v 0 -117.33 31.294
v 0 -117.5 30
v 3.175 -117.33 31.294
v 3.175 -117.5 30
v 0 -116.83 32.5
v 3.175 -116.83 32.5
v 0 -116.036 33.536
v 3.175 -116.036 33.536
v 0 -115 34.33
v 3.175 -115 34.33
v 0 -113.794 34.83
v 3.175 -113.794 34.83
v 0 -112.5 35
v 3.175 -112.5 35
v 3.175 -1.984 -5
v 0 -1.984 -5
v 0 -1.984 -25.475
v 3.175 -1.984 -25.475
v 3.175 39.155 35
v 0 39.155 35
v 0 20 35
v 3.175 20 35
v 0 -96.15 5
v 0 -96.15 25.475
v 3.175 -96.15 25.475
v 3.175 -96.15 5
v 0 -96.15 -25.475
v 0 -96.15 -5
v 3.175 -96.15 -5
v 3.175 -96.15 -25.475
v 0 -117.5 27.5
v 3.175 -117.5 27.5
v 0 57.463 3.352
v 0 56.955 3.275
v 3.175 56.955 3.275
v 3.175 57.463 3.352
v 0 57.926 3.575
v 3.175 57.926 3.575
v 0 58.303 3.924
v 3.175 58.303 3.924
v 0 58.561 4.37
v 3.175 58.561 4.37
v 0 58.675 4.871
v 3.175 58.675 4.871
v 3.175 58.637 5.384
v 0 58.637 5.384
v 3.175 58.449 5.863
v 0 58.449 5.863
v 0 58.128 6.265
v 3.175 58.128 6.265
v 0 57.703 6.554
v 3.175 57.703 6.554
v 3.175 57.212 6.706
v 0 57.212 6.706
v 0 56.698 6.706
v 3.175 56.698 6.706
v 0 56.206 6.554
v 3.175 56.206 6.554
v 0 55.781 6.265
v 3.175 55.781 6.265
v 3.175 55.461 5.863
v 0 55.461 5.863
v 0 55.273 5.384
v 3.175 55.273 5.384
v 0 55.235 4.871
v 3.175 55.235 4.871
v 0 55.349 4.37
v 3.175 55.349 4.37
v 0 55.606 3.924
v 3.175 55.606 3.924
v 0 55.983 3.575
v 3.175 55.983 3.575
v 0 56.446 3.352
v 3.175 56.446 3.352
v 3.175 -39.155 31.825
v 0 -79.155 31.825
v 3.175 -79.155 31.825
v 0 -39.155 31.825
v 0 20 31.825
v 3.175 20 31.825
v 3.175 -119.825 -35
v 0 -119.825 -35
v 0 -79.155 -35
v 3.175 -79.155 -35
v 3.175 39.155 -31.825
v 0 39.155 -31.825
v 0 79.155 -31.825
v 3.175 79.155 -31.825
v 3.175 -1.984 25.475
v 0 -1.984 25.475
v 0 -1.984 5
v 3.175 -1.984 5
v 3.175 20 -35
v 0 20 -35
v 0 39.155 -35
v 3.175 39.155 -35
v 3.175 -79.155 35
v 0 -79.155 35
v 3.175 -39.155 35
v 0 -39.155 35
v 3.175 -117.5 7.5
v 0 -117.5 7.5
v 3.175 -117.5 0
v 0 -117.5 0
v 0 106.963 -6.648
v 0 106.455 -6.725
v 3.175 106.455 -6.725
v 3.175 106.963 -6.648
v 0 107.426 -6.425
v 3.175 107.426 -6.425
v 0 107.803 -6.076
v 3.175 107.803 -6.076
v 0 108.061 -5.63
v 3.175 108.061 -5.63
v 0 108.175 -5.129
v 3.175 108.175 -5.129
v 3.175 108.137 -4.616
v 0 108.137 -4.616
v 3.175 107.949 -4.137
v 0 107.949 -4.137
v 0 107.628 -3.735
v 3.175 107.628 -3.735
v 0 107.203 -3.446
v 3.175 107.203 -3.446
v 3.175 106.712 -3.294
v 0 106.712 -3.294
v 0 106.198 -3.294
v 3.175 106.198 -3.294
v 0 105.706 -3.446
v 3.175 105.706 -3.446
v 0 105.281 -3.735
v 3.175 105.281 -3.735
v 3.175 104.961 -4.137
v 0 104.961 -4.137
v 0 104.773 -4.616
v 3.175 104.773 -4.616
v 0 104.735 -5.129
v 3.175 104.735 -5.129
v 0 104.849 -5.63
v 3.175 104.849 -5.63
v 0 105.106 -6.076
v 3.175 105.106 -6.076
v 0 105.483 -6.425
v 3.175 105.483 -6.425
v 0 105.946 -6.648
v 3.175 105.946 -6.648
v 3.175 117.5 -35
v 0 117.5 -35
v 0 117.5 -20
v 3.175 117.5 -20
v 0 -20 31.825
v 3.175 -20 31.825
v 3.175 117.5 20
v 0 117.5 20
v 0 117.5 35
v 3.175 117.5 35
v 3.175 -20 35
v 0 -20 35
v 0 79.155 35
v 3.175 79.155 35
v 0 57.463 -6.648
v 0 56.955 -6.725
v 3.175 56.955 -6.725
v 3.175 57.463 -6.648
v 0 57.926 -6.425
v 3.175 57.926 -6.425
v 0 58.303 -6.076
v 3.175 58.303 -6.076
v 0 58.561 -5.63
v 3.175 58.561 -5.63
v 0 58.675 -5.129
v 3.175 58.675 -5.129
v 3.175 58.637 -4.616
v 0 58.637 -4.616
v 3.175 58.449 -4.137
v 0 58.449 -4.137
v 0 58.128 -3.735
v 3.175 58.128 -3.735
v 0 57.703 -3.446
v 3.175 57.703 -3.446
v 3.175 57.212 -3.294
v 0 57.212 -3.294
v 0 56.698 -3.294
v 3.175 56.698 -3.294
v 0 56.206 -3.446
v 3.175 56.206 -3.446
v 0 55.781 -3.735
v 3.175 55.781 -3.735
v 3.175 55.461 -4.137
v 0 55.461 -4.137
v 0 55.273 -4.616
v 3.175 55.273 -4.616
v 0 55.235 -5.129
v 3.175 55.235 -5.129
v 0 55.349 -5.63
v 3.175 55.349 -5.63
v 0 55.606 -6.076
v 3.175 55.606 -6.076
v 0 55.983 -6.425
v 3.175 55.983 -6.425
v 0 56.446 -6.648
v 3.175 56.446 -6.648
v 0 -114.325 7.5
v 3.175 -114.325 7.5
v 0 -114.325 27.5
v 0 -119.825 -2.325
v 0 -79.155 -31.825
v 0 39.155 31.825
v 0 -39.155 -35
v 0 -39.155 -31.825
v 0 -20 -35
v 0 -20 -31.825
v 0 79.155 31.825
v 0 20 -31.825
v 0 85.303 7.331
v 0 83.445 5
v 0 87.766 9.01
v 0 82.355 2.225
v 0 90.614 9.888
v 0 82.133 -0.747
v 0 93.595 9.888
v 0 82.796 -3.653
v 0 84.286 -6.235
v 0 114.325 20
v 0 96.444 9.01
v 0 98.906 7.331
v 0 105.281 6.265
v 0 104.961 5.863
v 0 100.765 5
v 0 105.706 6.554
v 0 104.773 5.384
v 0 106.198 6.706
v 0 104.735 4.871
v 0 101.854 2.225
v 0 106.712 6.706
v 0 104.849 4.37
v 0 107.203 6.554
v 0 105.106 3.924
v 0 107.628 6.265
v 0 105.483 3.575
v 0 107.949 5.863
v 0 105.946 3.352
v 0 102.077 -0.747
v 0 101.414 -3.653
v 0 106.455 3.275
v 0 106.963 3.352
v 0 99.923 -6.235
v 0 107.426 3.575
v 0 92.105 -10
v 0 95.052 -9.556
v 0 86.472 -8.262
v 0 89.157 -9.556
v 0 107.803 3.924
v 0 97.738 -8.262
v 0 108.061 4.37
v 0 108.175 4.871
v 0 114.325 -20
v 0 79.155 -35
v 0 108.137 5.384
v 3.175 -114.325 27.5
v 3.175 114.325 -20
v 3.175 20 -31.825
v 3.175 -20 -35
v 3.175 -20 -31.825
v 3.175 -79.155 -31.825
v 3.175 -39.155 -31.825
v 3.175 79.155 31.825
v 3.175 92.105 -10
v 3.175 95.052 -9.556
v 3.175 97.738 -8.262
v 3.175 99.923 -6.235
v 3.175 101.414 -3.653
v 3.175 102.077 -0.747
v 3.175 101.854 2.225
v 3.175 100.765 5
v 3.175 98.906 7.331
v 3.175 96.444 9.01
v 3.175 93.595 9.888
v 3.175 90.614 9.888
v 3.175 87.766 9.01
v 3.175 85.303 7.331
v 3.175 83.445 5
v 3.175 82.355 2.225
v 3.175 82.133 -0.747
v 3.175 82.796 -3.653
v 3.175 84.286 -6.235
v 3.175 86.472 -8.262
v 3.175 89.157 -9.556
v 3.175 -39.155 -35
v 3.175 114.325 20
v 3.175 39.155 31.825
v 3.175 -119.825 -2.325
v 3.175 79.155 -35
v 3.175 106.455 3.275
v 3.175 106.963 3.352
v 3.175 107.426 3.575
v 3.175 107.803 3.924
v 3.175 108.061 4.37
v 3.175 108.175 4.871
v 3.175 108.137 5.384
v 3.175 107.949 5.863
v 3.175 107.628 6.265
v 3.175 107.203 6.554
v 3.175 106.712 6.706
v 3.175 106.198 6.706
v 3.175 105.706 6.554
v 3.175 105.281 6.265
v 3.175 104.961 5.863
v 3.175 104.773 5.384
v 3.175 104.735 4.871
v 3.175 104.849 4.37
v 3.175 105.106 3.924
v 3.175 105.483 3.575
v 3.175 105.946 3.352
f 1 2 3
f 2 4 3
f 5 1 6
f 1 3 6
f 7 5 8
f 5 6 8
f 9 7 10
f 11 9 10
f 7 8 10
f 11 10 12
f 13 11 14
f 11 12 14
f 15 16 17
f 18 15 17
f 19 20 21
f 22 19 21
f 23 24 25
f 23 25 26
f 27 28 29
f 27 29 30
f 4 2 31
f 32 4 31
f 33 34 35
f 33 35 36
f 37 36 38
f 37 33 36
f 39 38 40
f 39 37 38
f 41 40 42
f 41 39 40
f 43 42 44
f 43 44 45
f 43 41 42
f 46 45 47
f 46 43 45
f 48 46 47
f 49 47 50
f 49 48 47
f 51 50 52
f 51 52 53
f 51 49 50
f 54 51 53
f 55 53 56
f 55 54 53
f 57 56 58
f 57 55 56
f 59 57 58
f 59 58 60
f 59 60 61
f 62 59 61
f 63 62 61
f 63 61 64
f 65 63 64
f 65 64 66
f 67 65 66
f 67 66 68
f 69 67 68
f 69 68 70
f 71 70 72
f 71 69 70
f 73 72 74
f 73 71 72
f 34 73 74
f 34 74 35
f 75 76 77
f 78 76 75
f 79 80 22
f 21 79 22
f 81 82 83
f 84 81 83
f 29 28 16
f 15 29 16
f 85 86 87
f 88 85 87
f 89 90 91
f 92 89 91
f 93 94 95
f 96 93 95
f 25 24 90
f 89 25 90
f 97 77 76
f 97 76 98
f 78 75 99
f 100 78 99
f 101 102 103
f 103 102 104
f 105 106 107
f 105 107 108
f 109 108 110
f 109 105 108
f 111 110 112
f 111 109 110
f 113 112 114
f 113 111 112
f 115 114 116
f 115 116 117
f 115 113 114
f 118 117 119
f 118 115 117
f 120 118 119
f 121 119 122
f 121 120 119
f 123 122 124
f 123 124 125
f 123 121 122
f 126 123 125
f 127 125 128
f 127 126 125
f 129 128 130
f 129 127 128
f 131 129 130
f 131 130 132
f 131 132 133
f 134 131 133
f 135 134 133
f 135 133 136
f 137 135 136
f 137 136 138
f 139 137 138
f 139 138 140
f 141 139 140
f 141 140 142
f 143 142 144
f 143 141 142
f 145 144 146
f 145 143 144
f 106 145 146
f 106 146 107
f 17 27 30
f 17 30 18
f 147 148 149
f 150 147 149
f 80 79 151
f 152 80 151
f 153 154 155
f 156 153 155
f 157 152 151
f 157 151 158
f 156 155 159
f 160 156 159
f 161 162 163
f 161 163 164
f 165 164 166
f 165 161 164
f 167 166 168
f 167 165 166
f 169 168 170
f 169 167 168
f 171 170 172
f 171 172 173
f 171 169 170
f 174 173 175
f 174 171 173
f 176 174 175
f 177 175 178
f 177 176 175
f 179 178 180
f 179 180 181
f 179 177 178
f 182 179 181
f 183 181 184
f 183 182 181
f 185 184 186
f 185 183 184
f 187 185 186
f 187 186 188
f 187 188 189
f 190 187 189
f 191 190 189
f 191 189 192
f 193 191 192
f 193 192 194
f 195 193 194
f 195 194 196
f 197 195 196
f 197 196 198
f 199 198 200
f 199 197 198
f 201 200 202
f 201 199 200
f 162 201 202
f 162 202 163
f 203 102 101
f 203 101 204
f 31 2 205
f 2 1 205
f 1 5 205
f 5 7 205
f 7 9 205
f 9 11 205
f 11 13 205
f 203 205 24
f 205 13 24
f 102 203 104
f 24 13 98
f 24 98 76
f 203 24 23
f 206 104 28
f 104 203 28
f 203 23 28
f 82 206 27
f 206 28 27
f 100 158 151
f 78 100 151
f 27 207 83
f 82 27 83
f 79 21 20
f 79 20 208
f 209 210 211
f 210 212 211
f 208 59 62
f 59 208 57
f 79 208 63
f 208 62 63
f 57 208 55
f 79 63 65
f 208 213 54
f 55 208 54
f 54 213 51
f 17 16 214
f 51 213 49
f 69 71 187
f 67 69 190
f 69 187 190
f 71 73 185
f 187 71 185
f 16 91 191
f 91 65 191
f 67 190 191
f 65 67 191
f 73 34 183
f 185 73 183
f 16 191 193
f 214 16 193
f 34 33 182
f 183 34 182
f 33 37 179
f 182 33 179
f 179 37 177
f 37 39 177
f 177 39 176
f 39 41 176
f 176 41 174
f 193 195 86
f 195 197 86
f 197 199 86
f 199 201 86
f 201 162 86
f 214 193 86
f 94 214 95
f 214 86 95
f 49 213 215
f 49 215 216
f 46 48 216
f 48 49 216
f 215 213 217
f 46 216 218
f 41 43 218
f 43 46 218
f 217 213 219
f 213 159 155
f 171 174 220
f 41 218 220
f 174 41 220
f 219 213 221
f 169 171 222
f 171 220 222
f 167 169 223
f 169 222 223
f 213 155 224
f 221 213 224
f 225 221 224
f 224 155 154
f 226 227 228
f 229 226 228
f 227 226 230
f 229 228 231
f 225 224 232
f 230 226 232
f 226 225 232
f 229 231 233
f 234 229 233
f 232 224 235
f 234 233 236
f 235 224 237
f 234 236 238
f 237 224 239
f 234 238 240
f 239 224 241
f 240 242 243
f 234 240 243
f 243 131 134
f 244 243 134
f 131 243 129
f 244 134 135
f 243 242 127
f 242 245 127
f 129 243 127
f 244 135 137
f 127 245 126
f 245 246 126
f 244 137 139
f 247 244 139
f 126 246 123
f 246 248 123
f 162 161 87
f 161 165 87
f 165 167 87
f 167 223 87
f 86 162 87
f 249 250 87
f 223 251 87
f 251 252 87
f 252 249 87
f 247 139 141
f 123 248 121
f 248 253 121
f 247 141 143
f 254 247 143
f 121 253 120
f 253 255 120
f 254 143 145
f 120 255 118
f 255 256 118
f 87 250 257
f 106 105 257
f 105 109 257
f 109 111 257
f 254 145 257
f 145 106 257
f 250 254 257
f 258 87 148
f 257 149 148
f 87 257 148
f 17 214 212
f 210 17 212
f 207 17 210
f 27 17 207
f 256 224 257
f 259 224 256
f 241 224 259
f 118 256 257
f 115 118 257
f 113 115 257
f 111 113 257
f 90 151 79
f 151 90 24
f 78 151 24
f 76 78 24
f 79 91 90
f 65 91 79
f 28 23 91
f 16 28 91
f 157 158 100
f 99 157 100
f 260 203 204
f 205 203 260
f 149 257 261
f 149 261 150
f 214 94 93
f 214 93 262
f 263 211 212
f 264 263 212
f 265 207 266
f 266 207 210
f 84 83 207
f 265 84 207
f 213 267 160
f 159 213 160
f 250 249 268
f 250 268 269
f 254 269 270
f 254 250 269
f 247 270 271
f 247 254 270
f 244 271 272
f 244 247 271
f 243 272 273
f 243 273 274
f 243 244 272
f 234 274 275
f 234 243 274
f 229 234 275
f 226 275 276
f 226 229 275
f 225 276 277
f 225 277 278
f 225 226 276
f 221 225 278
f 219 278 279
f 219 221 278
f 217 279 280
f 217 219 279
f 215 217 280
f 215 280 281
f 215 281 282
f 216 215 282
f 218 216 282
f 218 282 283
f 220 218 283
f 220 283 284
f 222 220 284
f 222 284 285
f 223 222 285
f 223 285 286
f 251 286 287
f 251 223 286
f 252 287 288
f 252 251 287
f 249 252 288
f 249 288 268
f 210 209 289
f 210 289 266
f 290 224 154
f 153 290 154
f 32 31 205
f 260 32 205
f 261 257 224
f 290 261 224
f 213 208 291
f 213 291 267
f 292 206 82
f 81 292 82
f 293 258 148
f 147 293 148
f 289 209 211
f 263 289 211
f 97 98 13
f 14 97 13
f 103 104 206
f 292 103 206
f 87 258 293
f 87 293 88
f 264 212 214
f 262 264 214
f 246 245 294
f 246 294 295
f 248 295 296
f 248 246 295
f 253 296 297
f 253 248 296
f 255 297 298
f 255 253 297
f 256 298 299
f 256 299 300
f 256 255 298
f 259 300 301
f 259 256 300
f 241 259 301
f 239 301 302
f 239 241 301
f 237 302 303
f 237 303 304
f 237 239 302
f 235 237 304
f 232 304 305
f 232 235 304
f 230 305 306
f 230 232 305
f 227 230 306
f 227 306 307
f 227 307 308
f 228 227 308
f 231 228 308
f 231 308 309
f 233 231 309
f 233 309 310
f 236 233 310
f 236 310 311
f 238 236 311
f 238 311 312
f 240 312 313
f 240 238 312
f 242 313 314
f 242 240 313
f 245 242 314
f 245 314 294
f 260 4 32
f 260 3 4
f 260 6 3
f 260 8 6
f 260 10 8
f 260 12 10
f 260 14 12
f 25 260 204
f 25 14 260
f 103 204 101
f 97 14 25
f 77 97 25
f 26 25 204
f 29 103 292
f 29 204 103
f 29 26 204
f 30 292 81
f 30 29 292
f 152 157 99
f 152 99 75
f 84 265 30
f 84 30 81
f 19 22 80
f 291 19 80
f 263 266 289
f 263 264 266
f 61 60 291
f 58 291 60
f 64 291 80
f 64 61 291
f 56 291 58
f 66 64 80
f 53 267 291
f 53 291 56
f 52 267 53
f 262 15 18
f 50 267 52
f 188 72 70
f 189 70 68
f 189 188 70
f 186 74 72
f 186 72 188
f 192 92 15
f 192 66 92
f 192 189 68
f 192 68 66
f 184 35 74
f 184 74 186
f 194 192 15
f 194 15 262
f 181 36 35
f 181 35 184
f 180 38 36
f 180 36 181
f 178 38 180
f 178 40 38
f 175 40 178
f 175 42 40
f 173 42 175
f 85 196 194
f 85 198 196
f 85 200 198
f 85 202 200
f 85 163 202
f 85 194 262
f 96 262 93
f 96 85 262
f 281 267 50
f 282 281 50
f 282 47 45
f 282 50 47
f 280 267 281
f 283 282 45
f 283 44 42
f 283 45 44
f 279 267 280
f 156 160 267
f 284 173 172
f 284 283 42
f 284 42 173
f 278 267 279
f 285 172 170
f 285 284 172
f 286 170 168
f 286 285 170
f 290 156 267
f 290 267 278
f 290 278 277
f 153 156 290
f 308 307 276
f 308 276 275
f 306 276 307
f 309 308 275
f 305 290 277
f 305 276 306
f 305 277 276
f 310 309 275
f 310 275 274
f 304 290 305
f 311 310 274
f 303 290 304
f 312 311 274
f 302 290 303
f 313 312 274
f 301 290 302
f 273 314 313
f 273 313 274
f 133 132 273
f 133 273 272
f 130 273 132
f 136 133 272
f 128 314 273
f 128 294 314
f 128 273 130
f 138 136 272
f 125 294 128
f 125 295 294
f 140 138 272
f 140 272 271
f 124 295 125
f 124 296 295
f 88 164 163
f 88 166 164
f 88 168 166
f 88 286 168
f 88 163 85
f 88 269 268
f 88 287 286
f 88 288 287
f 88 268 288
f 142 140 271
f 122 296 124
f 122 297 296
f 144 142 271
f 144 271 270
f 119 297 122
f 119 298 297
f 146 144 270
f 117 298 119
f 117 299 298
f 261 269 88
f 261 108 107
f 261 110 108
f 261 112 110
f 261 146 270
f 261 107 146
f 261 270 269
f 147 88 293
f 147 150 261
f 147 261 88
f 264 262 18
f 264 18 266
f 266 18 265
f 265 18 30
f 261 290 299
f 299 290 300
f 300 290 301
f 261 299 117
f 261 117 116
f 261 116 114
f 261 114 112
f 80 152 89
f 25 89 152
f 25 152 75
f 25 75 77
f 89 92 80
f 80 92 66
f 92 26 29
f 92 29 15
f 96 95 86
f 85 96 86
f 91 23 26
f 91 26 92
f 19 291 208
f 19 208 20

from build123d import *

# Parameters (mm, degrees)
SKETCH2_W           = 20.475
SKETCH2_H           = 94.165655299
SKETCH2_R           = 1.725
SKETCH2_R_2         = 10
BOSS_EXTRUDE1_DEPTH = 3.175
SKETCH3_W           = 3.175
SKETCH3_H           = 40
SKETCH3_H_2         = 20
SKETCH3_W_2         = 40
SKETCH3_H_3         = 3.175
SKETCH3_W_3         = 20
CUT_EXTRUDE1_DEPTH  = 10
FILLET1_R           = 5


with BuildPart() as part:
    # Sketch2 → Boss-Extrude1 (new body)
    with BuildSketch(Plane(origin=(0, 0, 0), x_dir=(0, 0, -1), z_dir=(1, 0, 0))):
        Polygon((35, -119.825), (35, 117.5), (-35, 117.5), (-35, -117.5), (0, -117.5), (2.325, -119.825), align=None)
        with Locations((-15.2375, -49.067172351)):
            Rectangle(SKETCH2_W, SKETCH2_H, mode=Mode.SUBTRACT)
        with Locations((15.2375, -49.067172351)):
            Rectangle(SKETCH2_W, SKETCH2_H, mode=Mode.SUBTRACT)
        with Locations((5, 56.954767415)):
            Circle(SKETCH2_R, mode=Mode.SUBTRACT)
        with Locations((-5, 56.954767415)):
            Circle(SKETCH2_R, mode=Mode.SUBTRACT)
        with Locations((-5, 106.454767415)):
            Circle(SKETCH2_R, mode=Mode.SUBTRACT)
        with Locations((5, 106.454767415)):
            Circle(SKETCH2_R, mode=Mode.SUBTRACT)
        with Locations((0, 92.104767415)):
            Circle(SKETCH2_R_2, mode=Mode.SUBTRACT)
    extrude(amount=BOSS_EXTRUDE1_DEPTH)

    # Sketch3 → Cut-Extrude1 (cut)
    with BuildSketch(Plane.ZY):
        with Locations((-33.4125, 59.155293611)):
            Rectangle(SKETCH3_W, SKETCH3_H)
        with Locations((33.4125, 59.155293611)):
            Rectangle(SKETCH3_W, SKETCH3_H)
        with Locations((33.4125, 10)):
            Rectangle(SKETCH3_W, SKETCH3_H_2)
        with Locations((-33.4125, 10)):
            Rectangle(SKETCH3_W, SKETCH3_H_2)
        with Locations((-33.4125, -10)):
            Rectangle(SKETCH3_W, SKETCH3_H_2)
        with Locations((33.4125, -10)):
            Rectangle(SKETCH3_W, SKETCH3_H_2)
        with Locations((33.4125, -59.155293611)):
            Rectangle(SKETCH3_W, SKETCH3_H)
        with Locations((-33.4125, -59.155293611)):
            Rectangle(SKETCH3_W, SKETCH3_H)
        with Locations((0, 115.9125)):
            Rectangle(SKETCH3_W_2, SKETCH3_H_3)
        with Locations((17.5, -115.9125)):
            Rectangle(SKETCH3_W_3, SKETCH3_H_3)
    extrude(amount=-CUT_EXTRUDE1_DEPTH, mode=Mode.SUBTRACT)

    # Fillet1
    fillet1_edges = [part.edges().sort_by_distance(p)[0] for p in [
        (1.5875, -117.5, 35),
    ]]
    fillet(fillet1_edges, radius=FILLET1_R)


solid = part.part
